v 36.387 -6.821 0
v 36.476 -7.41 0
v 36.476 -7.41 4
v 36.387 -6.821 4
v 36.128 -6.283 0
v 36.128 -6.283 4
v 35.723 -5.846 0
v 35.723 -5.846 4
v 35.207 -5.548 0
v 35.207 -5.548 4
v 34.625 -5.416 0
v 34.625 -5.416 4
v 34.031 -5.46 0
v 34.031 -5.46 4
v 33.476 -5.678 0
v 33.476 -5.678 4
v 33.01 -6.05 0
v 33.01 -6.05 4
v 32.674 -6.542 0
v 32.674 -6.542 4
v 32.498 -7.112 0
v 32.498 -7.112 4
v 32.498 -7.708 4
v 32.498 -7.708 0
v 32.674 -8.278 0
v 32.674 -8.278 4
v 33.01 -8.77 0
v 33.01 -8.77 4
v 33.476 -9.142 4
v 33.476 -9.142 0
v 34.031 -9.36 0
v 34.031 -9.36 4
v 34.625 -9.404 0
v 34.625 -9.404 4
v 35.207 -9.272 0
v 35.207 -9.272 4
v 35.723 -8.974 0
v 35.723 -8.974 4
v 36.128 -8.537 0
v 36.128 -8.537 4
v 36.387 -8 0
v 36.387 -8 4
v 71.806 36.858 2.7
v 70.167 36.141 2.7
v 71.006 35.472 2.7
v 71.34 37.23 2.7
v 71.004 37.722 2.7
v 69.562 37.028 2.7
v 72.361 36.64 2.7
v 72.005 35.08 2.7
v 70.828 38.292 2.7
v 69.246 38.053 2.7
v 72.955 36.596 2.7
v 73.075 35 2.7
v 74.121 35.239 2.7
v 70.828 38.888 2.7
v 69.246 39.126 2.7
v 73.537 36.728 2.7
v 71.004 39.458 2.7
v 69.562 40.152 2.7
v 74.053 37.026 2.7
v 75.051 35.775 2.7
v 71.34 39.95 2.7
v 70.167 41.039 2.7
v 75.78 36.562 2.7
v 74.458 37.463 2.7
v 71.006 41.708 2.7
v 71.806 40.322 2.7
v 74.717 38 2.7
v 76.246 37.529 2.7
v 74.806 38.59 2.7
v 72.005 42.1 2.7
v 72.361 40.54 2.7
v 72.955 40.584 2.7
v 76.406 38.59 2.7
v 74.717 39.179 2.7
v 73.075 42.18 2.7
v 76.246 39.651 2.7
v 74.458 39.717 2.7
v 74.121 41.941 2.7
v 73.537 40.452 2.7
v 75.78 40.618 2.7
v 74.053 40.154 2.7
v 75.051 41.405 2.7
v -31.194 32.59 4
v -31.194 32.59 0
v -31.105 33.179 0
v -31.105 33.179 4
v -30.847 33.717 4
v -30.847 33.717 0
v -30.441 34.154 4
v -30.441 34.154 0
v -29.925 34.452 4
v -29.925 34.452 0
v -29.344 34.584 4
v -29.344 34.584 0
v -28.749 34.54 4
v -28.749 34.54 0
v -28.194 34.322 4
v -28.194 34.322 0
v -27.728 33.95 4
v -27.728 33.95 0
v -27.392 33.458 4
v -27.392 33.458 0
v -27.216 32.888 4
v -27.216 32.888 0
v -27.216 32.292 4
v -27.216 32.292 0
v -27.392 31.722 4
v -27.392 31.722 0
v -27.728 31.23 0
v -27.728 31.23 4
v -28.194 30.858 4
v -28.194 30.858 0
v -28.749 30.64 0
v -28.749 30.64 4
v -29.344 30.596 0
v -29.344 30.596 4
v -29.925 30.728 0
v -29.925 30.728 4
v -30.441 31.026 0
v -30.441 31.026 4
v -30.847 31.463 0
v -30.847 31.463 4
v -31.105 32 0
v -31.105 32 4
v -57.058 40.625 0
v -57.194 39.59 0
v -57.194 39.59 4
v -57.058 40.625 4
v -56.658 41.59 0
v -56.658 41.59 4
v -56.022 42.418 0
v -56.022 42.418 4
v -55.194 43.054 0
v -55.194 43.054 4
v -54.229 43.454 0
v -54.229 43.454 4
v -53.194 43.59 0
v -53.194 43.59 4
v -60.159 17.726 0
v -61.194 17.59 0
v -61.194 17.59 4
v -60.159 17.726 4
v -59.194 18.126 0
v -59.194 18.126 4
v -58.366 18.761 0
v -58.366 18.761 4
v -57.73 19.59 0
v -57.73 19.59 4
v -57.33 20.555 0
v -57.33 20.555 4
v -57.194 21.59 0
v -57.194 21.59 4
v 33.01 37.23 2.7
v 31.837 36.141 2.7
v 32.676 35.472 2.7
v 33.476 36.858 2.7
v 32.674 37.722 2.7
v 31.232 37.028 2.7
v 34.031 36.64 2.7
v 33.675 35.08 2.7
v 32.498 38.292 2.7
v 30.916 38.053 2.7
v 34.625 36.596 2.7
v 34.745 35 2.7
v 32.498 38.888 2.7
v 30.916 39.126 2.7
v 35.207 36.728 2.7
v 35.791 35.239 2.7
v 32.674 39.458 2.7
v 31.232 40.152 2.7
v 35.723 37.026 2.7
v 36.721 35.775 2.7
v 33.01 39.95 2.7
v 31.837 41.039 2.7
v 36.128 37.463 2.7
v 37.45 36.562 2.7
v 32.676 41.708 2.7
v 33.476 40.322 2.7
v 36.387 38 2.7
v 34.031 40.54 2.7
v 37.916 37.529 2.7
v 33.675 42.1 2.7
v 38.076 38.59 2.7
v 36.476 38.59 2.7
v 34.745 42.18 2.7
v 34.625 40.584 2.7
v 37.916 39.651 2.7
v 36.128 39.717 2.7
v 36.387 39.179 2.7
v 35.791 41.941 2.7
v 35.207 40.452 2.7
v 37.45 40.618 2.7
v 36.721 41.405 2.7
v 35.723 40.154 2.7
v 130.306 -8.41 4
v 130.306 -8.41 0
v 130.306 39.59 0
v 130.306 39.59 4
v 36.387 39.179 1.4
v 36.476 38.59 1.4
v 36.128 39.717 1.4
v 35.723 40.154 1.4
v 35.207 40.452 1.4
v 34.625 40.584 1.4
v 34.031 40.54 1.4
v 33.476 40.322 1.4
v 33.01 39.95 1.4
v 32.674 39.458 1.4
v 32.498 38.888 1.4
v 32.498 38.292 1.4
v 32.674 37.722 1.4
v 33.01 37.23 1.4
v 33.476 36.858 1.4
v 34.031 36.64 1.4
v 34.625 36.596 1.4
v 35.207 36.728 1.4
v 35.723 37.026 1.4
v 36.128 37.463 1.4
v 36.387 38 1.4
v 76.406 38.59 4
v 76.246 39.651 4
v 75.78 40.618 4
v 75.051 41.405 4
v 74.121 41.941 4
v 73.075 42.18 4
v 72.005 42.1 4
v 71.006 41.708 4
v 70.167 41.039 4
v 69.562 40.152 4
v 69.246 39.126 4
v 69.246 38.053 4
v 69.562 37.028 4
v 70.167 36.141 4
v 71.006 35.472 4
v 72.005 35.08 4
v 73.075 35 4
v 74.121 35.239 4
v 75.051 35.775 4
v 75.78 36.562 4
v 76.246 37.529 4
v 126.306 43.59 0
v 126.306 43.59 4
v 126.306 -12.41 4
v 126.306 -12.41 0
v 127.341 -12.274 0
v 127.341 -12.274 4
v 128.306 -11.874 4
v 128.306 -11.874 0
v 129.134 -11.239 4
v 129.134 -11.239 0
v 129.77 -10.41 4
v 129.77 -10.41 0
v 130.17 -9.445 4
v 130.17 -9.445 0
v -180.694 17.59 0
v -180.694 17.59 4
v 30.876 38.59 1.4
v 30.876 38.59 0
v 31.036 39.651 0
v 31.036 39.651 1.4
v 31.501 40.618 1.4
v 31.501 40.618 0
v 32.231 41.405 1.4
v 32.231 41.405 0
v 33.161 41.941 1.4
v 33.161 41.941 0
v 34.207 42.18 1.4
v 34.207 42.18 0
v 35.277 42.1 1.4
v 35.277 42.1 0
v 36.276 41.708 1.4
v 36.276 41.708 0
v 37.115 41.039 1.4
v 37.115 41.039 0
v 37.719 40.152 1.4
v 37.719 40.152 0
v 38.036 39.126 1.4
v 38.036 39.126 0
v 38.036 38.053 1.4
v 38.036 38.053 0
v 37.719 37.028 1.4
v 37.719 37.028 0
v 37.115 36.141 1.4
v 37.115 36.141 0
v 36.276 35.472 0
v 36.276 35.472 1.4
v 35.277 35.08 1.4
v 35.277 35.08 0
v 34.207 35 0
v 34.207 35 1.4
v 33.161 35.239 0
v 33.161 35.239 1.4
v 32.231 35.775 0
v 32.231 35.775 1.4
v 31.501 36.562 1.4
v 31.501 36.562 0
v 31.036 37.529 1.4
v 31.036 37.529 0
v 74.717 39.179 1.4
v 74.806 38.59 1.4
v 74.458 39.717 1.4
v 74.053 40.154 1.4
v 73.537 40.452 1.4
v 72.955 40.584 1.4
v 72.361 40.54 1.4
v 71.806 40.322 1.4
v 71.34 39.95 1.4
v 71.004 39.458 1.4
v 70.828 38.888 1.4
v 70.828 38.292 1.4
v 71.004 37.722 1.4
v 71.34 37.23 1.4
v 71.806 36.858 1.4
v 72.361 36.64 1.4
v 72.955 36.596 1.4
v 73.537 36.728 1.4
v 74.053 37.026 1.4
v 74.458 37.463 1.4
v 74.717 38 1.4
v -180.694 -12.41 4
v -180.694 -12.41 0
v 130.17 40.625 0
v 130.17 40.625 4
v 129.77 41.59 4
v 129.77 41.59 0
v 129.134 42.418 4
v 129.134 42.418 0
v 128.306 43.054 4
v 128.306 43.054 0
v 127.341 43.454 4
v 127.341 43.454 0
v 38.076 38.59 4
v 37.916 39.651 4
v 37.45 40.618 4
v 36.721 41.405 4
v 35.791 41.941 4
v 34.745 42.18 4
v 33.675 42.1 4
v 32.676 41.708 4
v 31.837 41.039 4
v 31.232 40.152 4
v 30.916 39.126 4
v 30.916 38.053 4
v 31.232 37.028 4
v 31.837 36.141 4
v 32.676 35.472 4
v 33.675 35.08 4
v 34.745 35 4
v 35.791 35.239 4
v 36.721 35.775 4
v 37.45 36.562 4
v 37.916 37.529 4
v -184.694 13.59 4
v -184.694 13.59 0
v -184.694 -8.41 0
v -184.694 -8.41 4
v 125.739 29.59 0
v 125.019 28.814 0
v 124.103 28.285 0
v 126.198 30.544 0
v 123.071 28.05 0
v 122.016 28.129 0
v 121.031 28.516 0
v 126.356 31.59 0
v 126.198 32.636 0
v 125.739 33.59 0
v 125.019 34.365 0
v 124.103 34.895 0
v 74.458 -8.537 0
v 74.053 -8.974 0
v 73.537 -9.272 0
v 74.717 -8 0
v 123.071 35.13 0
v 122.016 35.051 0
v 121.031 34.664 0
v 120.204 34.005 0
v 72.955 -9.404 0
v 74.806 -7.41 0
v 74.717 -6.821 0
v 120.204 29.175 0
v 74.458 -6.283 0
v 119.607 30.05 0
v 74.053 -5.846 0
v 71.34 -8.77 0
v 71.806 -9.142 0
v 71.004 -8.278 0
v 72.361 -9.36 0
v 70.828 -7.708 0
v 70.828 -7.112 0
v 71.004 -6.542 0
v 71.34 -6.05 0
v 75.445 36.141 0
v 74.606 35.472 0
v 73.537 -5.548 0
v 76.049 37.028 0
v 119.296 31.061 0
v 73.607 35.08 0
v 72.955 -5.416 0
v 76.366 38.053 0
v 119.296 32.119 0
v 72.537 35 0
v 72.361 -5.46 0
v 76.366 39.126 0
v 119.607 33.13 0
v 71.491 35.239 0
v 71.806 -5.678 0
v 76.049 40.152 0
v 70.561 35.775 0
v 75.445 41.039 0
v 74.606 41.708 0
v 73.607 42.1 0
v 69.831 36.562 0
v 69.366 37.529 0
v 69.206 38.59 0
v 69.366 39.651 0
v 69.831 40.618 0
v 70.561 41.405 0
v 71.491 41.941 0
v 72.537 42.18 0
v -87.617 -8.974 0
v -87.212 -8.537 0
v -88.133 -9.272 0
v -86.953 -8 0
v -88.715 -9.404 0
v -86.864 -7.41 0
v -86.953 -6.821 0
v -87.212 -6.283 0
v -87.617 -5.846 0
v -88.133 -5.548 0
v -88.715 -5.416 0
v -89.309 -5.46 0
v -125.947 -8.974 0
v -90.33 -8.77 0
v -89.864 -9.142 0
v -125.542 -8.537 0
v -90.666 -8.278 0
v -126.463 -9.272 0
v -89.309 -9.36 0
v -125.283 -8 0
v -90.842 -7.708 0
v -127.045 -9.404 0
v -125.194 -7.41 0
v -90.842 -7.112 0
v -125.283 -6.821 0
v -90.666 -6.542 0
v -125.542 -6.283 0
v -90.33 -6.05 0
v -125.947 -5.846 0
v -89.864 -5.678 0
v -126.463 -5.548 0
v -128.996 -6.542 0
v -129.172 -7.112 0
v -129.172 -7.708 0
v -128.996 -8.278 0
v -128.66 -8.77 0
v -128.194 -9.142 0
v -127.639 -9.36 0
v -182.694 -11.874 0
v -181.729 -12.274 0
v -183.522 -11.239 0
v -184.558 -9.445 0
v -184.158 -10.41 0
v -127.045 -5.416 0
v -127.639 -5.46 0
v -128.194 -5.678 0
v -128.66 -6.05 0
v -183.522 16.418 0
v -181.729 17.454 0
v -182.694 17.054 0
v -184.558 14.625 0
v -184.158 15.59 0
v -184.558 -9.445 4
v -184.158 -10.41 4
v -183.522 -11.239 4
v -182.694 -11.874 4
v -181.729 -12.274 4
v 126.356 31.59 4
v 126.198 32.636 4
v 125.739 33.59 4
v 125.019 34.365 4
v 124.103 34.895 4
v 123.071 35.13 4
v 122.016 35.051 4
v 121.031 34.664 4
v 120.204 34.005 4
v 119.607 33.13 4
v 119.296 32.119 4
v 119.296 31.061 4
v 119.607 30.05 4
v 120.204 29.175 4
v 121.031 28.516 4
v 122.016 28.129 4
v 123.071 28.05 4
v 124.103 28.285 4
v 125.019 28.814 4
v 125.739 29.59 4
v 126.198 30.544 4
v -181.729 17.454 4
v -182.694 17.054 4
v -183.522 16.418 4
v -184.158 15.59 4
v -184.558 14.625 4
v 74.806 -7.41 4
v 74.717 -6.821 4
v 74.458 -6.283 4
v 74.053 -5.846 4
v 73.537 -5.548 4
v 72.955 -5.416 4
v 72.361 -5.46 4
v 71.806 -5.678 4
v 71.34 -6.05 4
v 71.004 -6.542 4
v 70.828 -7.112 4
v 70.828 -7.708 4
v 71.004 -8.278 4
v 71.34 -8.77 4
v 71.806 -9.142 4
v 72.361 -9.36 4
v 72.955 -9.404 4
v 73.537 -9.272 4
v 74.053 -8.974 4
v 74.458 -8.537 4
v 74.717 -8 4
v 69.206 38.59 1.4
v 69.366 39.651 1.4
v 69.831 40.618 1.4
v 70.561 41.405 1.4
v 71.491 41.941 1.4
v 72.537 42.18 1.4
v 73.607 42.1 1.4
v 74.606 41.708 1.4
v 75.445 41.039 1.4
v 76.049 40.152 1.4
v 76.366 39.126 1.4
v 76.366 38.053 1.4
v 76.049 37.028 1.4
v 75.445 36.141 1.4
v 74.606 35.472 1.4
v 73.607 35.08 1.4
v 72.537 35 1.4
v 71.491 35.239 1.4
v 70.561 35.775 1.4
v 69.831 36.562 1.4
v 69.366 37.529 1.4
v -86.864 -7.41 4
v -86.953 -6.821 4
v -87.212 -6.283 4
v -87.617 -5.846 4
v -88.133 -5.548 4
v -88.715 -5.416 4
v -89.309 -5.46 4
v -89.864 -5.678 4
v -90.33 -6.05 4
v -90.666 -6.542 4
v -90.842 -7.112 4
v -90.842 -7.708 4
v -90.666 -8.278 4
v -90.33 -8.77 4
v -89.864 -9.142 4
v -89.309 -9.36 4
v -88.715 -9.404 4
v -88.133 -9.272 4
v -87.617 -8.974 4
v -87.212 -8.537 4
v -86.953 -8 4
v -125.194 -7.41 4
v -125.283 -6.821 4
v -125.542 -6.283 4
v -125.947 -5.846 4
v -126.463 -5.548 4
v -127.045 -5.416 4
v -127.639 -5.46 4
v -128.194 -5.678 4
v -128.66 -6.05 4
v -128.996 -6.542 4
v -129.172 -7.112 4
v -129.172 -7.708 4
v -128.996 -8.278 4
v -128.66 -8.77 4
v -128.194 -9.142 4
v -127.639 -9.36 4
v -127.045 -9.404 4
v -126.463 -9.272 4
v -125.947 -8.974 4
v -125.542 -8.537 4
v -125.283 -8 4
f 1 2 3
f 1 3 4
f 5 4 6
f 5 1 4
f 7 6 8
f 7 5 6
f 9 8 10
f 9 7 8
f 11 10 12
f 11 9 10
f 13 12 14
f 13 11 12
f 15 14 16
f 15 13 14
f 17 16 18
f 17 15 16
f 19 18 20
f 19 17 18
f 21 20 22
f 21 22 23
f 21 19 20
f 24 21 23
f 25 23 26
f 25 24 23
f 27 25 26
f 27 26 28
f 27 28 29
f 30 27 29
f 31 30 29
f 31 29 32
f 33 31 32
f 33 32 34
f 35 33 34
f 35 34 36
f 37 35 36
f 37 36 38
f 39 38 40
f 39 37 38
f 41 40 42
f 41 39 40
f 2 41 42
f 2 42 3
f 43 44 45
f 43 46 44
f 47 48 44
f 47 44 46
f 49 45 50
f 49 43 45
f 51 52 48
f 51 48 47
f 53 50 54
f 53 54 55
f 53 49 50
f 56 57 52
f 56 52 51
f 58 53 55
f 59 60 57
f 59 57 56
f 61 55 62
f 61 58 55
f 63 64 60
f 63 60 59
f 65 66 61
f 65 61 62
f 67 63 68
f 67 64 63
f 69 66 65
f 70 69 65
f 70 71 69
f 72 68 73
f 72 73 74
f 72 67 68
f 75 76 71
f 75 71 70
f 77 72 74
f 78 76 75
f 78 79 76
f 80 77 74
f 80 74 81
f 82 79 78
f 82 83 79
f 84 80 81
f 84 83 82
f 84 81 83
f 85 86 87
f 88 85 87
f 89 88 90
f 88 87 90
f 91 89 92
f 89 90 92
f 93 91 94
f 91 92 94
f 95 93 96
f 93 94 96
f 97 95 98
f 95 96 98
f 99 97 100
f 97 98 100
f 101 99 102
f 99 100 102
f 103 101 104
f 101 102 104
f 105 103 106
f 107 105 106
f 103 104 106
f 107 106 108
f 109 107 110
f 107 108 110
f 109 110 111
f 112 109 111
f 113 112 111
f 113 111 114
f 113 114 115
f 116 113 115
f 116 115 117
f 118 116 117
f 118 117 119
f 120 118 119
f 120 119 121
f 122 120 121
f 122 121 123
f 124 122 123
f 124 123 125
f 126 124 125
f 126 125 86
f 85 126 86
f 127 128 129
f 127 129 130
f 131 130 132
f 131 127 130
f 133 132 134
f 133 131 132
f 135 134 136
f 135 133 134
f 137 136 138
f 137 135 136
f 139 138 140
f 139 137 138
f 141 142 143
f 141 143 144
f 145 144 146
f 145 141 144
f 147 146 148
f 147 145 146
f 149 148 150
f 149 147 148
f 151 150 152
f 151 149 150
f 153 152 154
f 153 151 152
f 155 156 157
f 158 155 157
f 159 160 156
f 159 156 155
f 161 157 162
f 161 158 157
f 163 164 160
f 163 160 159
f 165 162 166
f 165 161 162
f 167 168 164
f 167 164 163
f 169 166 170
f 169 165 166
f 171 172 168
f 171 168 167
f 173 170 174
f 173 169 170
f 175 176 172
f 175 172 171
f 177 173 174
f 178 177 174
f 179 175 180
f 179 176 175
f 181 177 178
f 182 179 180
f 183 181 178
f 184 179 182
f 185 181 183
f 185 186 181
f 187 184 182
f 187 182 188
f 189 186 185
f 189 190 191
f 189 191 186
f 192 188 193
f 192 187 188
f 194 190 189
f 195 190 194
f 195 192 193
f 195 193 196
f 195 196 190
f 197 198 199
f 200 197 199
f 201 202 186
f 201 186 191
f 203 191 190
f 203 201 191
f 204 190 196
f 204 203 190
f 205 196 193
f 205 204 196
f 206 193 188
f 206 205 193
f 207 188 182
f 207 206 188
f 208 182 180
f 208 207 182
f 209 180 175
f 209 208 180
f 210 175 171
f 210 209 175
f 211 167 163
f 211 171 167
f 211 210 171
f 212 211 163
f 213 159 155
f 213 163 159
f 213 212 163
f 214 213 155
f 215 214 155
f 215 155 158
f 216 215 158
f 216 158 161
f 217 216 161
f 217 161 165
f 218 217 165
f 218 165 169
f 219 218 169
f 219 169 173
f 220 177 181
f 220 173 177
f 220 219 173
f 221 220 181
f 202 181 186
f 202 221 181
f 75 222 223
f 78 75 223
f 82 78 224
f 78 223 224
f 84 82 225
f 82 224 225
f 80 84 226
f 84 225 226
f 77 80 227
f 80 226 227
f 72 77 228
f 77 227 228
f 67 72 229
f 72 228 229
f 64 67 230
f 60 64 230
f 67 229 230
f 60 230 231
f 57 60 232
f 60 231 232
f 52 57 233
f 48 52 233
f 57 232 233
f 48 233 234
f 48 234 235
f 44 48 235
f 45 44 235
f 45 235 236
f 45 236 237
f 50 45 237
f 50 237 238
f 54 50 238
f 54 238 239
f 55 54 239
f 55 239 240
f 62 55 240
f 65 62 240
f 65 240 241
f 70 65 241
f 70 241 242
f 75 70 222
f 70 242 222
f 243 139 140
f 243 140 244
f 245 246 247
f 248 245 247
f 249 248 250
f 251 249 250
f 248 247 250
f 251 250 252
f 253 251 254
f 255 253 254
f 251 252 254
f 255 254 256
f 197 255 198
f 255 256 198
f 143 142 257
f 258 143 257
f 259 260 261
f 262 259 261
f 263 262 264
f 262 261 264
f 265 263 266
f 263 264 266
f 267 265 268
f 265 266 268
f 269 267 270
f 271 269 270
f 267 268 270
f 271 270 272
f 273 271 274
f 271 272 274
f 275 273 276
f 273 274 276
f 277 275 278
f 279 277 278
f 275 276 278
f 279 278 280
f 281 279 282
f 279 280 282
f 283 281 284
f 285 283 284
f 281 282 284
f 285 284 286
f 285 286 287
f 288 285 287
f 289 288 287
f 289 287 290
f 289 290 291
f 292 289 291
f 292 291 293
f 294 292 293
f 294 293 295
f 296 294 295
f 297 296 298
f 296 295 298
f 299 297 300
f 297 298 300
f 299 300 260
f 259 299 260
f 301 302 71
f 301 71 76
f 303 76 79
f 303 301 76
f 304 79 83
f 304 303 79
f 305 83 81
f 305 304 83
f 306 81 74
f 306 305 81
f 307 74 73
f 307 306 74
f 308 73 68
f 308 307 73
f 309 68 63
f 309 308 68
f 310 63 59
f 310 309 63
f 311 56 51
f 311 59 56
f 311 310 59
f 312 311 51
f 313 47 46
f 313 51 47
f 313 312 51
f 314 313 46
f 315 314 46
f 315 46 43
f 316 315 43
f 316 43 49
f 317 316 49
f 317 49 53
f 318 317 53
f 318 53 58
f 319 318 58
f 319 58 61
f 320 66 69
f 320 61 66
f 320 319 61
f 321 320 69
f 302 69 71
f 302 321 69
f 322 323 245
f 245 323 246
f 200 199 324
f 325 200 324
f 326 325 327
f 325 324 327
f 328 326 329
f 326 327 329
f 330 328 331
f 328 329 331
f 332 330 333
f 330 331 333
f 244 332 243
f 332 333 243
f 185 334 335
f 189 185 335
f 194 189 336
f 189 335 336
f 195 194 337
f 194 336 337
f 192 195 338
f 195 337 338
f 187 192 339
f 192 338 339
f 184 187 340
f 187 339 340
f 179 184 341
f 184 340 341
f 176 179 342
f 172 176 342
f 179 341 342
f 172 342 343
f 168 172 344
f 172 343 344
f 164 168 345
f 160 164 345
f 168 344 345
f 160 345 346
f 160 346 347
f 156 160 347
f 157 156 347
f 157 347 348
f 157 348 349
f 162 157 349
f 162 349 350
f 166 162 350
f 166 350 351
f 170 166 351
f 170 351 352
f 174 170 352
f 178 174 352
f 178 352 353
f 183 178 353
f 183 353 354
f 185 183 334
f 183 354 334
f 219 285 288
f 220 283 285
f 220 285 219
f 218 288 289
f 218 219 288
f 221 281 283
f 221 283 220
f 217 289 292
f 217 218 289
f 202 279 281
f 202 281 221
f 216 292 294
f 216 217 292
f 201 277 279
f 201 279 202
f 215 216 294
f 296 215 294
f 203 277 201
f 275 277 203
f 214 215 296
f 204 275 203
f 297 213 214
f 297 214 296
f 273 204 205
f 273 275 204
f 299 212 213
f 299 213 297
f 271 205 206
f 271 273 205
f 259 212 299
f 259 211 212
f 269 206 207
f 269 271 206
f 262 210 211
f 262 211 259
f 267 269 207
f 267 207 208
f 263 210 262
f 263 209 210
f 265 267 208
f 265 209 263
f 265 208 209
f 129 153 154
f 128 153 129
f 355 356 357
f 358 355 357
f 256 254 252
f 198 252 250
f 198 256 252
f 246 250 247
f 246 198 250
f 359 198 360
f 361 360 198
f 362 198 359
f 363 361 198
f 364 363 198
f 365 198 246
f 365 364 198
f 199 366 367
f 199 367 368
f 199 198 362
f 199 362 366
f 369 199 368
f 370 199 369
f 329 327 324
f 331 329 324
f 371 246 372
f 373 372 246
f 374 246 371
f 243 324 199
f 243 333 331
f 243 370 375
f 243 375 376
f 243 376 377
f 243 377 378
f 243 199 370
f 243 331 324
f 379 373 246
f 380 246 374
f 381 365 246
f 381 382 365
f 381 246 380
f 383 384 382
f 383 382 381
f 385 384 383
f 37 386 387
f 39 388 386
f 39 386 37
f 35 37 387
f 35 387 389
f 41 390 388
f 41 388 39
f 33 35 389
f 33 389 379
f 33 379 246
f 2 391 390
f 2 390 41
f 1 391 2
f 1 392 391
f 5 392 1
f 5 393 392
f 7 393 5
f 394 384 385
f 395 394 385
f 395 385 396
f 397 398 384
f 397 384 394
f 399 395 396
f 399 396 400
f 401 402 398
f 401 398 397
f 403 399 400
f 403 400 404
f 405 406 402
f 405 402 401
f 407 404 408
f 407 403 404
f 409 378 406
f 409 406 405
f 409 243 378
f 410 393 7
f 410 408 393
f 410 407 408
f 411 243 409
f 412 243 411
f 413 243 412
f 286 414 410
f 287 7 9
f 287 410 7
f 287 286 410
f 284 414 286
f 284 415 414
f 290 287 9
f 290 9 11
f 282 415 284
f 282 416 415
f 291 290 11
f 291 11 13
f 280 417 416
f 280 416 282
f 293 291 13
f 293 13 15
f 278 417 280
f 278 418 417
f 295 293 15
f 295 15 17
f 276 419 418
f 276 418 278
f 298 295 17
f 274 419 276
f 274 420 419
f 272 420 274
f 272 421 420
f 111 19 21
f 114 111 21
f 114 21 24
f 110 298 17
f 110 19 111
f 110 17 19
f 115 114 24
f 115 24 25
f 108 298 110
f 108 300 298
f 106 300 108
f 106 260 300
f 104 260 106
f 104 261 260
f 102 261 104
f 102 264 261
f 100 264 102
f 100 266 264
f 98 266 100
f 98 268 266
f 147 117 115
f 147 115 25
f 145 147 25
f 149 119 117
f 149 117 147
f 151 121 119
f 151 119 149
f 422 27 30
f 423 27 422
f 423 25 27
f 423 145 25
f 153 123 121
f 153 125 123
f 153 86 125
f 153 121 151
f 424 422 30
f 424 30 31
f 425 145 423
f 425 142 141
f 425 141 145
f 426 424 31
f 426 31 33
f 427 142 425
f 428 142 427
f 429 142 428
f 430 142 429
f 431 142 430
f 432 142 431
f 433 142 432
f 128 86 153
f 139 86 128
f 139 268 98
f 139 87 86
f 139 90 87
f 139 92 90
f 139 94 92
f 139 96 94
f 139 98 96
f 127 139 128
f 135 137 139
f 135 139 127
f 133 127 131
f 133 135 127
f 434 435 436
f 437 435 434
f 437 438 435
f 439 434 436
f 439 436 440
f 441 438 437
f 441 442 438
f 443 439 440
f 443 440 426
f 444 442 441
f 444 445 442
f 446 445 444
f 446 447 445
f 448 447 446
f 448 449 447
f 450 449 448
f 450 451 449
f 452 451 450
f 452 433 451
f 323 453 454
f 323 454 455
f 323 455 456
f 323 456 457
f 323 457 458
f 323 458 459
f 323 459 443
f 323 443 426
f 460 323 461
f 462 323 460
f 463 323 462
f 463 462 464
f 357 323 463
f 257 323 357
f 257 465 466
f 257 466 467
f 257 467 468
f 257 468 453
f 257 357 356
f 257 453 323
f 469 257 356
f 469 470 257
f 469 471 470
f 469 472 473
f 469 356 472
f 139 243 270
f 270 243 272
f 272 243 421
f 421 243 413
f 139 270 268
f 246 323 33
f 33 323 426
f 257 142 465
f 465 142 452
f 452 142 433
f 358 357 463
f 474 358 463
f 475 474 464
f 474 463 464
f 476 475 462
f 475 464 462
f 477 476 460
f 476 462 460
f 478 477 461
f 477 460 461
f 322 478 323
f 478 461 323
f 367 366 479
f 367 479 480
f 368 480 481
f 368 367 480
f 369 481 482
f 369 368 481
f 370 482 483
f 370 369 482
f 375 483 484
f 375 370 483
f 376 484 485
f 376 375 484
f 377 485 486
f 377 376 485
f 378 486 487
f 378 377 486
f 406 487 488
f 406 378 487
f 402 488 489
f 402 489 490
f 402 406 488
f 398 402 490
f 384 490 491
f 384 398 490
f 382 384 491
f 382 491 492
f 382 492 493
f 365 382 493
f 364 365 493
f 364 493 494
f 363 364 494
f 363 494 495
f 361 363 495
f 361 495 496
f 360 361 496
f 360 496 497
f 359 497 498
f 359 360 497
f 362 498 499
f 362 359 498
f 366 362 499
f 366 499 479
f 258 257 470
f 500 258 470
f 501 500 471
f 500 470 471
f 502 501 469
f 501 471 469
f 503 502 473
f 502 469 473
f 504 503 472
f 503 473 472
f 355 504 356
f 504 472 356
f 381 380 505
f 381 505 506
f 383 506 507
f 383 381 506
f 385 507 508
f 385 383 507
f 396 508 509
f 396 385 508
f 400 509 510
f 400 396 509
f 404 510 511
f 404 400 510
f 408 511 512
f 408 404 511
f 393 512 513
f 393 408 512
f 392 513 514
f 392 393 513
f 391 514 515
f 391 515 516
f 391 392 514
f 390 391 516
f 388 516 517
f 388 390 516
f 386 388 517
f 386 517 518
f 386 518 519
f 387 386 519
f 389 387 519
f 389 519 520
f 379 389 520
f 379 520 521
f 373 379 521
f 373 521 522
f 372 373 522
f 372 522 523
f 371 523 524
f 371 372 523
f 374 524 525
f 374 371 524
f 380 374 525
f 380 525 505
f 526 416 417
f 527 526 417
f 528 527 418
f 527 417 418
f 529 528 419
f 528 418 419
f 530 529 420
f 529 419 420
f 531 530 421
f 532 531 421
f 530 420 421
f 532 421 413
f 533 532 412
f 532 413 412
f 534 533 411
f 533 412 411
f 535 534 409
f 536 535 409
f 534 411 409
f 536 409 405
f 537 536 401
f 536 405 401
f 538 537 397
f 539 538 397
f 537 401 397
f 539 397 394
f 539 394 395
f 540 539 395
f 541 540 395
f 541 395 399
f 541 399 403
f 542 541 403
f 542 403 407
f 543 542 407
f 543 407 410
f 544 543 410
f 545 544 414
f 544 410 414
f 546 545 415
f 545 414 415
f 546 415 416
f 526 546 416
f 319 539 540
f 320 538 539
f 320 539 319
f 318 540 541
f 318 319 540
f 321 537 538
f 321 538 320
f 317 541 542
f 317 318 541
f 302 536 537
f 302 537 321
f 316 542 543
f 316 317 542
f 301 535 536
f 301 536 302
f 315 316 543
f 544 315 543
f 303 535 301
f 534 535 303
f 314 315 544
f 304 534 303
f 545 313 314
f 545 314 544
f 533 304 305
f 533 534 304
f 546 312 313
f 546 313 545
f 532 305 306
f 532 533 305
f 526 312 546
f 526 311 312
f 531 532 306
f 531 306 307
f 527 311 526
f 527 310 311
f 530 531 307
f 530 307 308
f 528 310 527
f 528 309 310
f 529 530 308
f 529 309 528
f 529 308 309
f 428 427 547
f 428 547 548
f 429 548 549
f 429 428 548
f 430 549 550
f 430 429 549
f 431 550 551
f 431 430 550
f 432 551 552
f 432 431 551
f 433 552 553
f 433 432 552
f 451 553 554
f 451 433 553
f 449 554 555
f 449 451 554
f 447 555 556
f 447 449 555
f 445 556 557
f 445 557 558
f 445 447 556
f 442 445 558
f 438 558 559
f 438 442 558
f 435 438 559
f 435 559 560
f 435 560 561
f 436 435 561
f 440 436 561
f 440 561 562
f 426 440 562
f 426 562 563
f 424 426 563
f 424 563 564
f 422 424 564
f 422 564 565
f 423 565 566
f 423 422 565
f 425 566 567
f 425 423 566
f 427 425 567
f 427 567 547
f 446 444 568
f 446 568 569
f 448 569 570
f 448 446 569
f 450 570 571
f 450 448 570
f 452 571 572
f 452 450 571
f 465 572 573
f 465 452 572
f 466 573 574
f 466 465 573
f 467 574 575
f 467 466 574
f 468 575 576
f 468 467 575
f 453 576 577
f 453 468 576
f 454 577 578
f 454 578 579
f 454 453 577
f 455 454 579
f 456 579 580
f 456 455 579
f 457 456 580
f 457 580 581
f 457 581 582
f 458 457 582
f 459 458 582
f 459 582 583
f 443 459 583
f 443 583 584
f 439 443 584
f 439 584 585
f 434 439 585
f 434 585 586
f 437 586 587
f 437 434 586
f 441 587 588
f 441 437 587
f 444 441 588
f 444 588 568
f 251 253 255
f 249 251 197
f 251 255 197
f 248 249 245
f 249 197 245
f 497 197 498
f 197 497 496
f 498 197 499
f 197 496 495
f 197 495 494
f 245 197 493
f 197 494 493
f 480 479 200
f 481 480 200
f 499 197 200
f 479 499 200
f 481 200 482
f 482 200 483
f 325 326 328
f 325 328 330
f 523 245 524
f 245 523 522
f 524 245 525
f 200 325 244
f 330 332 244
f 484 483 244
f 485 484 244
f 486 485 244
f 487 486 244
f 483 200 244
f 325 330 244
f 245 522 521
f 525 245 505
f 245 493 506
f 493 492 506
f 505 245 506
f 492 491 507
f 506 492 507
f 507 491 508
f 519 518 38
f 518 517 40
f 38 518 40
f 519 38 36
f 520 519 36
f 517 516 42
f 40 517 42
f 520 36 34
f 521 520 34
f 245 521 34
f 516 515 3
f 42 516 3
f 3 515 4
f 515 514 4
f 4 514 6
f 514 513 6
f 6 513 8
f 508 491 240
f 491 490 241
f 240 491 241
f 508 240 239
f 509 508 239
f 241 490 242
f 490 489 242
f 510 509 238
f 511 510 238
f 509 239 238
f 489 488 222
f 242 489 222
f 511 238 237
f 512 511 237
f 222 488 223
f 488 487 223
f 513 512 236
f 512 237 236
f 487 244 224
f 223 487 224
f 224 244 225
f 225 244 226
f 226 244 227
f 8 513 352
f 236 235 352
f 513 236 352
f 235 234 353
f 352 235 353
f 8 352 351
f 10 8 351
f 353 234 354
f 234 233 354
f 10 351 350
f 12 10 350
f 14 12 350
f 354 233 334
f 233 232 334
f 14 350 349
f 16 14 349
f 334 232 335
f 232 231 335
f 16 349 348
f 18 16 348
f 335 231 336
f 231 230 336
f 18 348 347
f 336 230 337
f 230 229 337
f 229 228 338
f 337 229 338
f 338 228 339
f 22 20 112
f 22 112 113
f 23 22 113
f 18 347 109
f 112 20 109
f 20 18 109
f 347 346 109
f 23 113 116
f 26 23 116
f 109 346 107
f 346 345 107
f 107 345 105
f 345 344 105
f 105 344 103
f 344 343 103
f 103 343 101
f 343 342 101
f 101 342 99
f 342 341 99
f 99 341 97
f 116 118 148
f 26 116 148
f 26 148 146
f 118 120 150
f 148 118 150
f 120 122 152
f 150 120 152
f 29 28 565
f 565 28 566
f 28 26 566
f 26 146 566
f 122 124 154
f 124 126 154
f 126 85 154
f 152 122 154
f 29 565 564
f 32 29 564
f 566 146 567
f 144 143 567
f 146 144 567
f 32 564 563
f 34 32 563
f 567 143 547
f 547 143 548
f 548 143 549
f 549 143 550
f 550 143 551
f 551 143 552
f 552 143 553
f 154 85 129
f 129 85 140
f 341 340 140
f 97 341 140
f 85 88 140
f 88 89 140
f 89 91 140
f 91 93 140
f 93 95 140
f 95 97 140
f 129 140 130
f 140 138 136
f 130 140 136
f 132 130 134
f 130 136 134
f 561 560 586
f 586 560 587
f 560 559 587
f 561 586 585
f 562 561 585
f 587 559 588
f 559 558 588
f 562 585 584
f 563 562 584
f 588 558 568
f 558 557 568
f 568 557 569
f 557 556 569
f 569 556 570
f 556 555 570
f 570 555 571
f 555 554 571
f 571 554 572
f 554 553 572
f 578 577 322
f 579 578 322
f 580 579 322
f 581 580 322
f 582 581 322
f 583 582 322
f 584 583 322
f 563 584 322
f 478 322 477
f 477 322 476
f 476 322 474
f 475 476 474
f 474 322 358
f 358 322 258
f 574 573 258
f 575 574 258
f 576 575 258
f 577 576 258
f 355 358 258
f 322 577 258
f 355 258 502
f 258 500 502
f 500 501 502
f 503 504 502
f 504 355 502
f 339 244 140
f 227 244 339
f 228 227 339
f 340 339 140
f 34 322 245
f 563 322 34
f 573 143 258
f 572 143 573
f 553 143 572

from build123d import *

# Parameters (mm, degrees)
SKETCH_1_R          = 2
SKETCH_1_R_2        = 3.55
EXTRUDE_1_DEPTH     = 4
EXTRUDE_3_DEPTH     = 4
SKETCH_3_R          = 3.6
CUT_EXTRUDE_1_DEPTH = 1.4
SKETCH_7_R          = 2
CUT_EXTRUDE_2_DEPTH = 10
SKETCH_8_R          = 3.6
CUT_EXTRUDE_3_DEPTH = 1.3


with BuildPart() as part:
    # 草图1 → 凸台-拉伸1 (new body)
    with BuildSketch(Plane.XY):
        with BuildLine():
            Line((-180.694062755, -12.410089261), (126.305937245, -12.410089261))
            ThreePointArc((126.305937245, -12.410089261), (129.13436437, -11.238516386), (130.305937245, -8.410089261))
            Line((130.305937245, -8.410089261), (130.305937245, 7.71191214))
            Line((130.305937245, 7.71191214), (130.305937245, 17.589910739))
            Line((130.305937245, 17.589910739), (130.305937245, 39.589910739))
            ThreePointArc((130.305937245, 39.589910739), (129.13436437, 42.418337863), (126.305937245, 43.589910739))
            Line((126.305937245, 43.589910739), (-23.194062755, 43.589910739))
            ThreePointArc((-23.194062755, 43.589910739), (-26.022489879, 42.418337863), (-27.194062755, 39.589910739))
            Line((-27.194062755, 39.589910739), (-27.194062755, 27.589910739))
            ThreePointArc((-27.194062755, 27.589910739), (-30.122994943, 20.518842927), (-37.194062755, 17.589910739))
            Line((-37.194062755, 17.589910739), (-180.694062755, 17.589910739))
            ThreePointArc((-180.694062755, 17.589910739), (-183.522489879, 16.418337863), (-184.694062755, 13.589910739))
            Line((-184.694062755, 13.589910739), (-184.694062755, -8.410089261))
            ThreePointArc((-184.694062755, -8.410089261), (-183.522489879, -11.238516386), (-180.694062755, -12.410089261))
        make_face()
        with Locations((-127.194062755, -7.410089261)):
            Circle(SKETCH_1_R, mode=Mode.SUBTRACT)
        with Locations((-88.864062755, -7.410089261)):
            Circle(SKETCH_1_R, mode=Mode.SUBTRACT)
        with Locations((34.475937245, -7.410089261)):
            Circle(SKETCH_1_R, mode=Mode.SUBTRACT)
        with Locations((72.805937245, -7.410089261)):
            Circle(SKETCH_1_R, mode=Mode.SUBTRACT)
        with Locations((34.475937245, 38.589910739)):
            Circle(SKETCH_1_R, mode=Mode.SUBTRACT)
        with Locations((122.805937245, 31.589910739)):
            Circle(SKETCH_1_R_2, mode=Mode.SUBTRACT)
        with Locations((72.805937245, 38.589910739)):
            Circle(SKETCH_1_R, mode=Mode.SUBTRACT)
    extrude(amount=EXTRUDE_1_DEPTH)

    # 草图2 → 凸台-拉伸3 (add)
    with BuildSketch(Plane(origin=(0, 0, 0), x_dir=(-1, 0, 0), z_dir=(0, 0, -1))):
        with BuildLine():
            Line((53.194062755, 43.589910739), (23.194062755, 43.589910739))
            Line((23.194062755, 43.589910739), (23.194062755, 17.589910739))
            Line((23.194062755, 17.589910739), (57.194062755, 17.589910739))
            Line((57.194062755, 17.589910739), (61.194062755, 17.589910739))
            ThreePointArc((61.194062755, 17.589910739), (58.36563563, 18.761483614), (57.194062755, 21.589910739))
            Line((57.194062755, 21.589910739), (57.194062755, 39.589910739))
            ThreePointArc((57.194062755, 39.589910739), (56.022489879, 42.418337863), (53.194062755, 43.589910739))
        make_face()
    extrude(amount=-EXTRUDE_3_DEPTH)

    # 草图3 → 切除-拉伸1 (cut)
    with BuildSketch(Plane(origin=(0, 0, 0), x_dir=(-1, 0, 0), z_dir=(0, 0, -1))):
        with Locations((-72.805937245, 38.589910739)):
            Circle(SKETCH_3_R)
        with Locations((-34.475937245, 38.589910739)):
            Circle(SKETCH_3_R)
    extrude(amount=-CUT_EXTRUDE_1_DEPTH, mode=Mode.SUBTRACT)

    # 草图7 → 切除-拉伸2 (cut)
    with BuildSketch(Plane(origin=(0, 0, 0), x_dir=(-1, 0, 0), z_dir=(0, 0, -1))):
        with Locations((29.194062755, 32.589910739)):
            Circle(SKETCH_7_R)
    extrude(amount=-CUT_EXTRUDE_2_DEPTH, mode=Mode.SUBTRACT)

    # 草图8 → 切除-拉伸3 (cut)
    with BuildSketch(Plane.XY.offset(4)):
        with Locations((72.805937245, 38.589910739)):
            Circle(SKETCH_8_R)
        with Locations((34.475937245, 38.589910739)):
            Circle(SKETCH_8_R)
    extrude(amount=-CUT_EXTRUDE_3_DEPTH, mode=Mode.SUBTRACT)


solid = part.part
